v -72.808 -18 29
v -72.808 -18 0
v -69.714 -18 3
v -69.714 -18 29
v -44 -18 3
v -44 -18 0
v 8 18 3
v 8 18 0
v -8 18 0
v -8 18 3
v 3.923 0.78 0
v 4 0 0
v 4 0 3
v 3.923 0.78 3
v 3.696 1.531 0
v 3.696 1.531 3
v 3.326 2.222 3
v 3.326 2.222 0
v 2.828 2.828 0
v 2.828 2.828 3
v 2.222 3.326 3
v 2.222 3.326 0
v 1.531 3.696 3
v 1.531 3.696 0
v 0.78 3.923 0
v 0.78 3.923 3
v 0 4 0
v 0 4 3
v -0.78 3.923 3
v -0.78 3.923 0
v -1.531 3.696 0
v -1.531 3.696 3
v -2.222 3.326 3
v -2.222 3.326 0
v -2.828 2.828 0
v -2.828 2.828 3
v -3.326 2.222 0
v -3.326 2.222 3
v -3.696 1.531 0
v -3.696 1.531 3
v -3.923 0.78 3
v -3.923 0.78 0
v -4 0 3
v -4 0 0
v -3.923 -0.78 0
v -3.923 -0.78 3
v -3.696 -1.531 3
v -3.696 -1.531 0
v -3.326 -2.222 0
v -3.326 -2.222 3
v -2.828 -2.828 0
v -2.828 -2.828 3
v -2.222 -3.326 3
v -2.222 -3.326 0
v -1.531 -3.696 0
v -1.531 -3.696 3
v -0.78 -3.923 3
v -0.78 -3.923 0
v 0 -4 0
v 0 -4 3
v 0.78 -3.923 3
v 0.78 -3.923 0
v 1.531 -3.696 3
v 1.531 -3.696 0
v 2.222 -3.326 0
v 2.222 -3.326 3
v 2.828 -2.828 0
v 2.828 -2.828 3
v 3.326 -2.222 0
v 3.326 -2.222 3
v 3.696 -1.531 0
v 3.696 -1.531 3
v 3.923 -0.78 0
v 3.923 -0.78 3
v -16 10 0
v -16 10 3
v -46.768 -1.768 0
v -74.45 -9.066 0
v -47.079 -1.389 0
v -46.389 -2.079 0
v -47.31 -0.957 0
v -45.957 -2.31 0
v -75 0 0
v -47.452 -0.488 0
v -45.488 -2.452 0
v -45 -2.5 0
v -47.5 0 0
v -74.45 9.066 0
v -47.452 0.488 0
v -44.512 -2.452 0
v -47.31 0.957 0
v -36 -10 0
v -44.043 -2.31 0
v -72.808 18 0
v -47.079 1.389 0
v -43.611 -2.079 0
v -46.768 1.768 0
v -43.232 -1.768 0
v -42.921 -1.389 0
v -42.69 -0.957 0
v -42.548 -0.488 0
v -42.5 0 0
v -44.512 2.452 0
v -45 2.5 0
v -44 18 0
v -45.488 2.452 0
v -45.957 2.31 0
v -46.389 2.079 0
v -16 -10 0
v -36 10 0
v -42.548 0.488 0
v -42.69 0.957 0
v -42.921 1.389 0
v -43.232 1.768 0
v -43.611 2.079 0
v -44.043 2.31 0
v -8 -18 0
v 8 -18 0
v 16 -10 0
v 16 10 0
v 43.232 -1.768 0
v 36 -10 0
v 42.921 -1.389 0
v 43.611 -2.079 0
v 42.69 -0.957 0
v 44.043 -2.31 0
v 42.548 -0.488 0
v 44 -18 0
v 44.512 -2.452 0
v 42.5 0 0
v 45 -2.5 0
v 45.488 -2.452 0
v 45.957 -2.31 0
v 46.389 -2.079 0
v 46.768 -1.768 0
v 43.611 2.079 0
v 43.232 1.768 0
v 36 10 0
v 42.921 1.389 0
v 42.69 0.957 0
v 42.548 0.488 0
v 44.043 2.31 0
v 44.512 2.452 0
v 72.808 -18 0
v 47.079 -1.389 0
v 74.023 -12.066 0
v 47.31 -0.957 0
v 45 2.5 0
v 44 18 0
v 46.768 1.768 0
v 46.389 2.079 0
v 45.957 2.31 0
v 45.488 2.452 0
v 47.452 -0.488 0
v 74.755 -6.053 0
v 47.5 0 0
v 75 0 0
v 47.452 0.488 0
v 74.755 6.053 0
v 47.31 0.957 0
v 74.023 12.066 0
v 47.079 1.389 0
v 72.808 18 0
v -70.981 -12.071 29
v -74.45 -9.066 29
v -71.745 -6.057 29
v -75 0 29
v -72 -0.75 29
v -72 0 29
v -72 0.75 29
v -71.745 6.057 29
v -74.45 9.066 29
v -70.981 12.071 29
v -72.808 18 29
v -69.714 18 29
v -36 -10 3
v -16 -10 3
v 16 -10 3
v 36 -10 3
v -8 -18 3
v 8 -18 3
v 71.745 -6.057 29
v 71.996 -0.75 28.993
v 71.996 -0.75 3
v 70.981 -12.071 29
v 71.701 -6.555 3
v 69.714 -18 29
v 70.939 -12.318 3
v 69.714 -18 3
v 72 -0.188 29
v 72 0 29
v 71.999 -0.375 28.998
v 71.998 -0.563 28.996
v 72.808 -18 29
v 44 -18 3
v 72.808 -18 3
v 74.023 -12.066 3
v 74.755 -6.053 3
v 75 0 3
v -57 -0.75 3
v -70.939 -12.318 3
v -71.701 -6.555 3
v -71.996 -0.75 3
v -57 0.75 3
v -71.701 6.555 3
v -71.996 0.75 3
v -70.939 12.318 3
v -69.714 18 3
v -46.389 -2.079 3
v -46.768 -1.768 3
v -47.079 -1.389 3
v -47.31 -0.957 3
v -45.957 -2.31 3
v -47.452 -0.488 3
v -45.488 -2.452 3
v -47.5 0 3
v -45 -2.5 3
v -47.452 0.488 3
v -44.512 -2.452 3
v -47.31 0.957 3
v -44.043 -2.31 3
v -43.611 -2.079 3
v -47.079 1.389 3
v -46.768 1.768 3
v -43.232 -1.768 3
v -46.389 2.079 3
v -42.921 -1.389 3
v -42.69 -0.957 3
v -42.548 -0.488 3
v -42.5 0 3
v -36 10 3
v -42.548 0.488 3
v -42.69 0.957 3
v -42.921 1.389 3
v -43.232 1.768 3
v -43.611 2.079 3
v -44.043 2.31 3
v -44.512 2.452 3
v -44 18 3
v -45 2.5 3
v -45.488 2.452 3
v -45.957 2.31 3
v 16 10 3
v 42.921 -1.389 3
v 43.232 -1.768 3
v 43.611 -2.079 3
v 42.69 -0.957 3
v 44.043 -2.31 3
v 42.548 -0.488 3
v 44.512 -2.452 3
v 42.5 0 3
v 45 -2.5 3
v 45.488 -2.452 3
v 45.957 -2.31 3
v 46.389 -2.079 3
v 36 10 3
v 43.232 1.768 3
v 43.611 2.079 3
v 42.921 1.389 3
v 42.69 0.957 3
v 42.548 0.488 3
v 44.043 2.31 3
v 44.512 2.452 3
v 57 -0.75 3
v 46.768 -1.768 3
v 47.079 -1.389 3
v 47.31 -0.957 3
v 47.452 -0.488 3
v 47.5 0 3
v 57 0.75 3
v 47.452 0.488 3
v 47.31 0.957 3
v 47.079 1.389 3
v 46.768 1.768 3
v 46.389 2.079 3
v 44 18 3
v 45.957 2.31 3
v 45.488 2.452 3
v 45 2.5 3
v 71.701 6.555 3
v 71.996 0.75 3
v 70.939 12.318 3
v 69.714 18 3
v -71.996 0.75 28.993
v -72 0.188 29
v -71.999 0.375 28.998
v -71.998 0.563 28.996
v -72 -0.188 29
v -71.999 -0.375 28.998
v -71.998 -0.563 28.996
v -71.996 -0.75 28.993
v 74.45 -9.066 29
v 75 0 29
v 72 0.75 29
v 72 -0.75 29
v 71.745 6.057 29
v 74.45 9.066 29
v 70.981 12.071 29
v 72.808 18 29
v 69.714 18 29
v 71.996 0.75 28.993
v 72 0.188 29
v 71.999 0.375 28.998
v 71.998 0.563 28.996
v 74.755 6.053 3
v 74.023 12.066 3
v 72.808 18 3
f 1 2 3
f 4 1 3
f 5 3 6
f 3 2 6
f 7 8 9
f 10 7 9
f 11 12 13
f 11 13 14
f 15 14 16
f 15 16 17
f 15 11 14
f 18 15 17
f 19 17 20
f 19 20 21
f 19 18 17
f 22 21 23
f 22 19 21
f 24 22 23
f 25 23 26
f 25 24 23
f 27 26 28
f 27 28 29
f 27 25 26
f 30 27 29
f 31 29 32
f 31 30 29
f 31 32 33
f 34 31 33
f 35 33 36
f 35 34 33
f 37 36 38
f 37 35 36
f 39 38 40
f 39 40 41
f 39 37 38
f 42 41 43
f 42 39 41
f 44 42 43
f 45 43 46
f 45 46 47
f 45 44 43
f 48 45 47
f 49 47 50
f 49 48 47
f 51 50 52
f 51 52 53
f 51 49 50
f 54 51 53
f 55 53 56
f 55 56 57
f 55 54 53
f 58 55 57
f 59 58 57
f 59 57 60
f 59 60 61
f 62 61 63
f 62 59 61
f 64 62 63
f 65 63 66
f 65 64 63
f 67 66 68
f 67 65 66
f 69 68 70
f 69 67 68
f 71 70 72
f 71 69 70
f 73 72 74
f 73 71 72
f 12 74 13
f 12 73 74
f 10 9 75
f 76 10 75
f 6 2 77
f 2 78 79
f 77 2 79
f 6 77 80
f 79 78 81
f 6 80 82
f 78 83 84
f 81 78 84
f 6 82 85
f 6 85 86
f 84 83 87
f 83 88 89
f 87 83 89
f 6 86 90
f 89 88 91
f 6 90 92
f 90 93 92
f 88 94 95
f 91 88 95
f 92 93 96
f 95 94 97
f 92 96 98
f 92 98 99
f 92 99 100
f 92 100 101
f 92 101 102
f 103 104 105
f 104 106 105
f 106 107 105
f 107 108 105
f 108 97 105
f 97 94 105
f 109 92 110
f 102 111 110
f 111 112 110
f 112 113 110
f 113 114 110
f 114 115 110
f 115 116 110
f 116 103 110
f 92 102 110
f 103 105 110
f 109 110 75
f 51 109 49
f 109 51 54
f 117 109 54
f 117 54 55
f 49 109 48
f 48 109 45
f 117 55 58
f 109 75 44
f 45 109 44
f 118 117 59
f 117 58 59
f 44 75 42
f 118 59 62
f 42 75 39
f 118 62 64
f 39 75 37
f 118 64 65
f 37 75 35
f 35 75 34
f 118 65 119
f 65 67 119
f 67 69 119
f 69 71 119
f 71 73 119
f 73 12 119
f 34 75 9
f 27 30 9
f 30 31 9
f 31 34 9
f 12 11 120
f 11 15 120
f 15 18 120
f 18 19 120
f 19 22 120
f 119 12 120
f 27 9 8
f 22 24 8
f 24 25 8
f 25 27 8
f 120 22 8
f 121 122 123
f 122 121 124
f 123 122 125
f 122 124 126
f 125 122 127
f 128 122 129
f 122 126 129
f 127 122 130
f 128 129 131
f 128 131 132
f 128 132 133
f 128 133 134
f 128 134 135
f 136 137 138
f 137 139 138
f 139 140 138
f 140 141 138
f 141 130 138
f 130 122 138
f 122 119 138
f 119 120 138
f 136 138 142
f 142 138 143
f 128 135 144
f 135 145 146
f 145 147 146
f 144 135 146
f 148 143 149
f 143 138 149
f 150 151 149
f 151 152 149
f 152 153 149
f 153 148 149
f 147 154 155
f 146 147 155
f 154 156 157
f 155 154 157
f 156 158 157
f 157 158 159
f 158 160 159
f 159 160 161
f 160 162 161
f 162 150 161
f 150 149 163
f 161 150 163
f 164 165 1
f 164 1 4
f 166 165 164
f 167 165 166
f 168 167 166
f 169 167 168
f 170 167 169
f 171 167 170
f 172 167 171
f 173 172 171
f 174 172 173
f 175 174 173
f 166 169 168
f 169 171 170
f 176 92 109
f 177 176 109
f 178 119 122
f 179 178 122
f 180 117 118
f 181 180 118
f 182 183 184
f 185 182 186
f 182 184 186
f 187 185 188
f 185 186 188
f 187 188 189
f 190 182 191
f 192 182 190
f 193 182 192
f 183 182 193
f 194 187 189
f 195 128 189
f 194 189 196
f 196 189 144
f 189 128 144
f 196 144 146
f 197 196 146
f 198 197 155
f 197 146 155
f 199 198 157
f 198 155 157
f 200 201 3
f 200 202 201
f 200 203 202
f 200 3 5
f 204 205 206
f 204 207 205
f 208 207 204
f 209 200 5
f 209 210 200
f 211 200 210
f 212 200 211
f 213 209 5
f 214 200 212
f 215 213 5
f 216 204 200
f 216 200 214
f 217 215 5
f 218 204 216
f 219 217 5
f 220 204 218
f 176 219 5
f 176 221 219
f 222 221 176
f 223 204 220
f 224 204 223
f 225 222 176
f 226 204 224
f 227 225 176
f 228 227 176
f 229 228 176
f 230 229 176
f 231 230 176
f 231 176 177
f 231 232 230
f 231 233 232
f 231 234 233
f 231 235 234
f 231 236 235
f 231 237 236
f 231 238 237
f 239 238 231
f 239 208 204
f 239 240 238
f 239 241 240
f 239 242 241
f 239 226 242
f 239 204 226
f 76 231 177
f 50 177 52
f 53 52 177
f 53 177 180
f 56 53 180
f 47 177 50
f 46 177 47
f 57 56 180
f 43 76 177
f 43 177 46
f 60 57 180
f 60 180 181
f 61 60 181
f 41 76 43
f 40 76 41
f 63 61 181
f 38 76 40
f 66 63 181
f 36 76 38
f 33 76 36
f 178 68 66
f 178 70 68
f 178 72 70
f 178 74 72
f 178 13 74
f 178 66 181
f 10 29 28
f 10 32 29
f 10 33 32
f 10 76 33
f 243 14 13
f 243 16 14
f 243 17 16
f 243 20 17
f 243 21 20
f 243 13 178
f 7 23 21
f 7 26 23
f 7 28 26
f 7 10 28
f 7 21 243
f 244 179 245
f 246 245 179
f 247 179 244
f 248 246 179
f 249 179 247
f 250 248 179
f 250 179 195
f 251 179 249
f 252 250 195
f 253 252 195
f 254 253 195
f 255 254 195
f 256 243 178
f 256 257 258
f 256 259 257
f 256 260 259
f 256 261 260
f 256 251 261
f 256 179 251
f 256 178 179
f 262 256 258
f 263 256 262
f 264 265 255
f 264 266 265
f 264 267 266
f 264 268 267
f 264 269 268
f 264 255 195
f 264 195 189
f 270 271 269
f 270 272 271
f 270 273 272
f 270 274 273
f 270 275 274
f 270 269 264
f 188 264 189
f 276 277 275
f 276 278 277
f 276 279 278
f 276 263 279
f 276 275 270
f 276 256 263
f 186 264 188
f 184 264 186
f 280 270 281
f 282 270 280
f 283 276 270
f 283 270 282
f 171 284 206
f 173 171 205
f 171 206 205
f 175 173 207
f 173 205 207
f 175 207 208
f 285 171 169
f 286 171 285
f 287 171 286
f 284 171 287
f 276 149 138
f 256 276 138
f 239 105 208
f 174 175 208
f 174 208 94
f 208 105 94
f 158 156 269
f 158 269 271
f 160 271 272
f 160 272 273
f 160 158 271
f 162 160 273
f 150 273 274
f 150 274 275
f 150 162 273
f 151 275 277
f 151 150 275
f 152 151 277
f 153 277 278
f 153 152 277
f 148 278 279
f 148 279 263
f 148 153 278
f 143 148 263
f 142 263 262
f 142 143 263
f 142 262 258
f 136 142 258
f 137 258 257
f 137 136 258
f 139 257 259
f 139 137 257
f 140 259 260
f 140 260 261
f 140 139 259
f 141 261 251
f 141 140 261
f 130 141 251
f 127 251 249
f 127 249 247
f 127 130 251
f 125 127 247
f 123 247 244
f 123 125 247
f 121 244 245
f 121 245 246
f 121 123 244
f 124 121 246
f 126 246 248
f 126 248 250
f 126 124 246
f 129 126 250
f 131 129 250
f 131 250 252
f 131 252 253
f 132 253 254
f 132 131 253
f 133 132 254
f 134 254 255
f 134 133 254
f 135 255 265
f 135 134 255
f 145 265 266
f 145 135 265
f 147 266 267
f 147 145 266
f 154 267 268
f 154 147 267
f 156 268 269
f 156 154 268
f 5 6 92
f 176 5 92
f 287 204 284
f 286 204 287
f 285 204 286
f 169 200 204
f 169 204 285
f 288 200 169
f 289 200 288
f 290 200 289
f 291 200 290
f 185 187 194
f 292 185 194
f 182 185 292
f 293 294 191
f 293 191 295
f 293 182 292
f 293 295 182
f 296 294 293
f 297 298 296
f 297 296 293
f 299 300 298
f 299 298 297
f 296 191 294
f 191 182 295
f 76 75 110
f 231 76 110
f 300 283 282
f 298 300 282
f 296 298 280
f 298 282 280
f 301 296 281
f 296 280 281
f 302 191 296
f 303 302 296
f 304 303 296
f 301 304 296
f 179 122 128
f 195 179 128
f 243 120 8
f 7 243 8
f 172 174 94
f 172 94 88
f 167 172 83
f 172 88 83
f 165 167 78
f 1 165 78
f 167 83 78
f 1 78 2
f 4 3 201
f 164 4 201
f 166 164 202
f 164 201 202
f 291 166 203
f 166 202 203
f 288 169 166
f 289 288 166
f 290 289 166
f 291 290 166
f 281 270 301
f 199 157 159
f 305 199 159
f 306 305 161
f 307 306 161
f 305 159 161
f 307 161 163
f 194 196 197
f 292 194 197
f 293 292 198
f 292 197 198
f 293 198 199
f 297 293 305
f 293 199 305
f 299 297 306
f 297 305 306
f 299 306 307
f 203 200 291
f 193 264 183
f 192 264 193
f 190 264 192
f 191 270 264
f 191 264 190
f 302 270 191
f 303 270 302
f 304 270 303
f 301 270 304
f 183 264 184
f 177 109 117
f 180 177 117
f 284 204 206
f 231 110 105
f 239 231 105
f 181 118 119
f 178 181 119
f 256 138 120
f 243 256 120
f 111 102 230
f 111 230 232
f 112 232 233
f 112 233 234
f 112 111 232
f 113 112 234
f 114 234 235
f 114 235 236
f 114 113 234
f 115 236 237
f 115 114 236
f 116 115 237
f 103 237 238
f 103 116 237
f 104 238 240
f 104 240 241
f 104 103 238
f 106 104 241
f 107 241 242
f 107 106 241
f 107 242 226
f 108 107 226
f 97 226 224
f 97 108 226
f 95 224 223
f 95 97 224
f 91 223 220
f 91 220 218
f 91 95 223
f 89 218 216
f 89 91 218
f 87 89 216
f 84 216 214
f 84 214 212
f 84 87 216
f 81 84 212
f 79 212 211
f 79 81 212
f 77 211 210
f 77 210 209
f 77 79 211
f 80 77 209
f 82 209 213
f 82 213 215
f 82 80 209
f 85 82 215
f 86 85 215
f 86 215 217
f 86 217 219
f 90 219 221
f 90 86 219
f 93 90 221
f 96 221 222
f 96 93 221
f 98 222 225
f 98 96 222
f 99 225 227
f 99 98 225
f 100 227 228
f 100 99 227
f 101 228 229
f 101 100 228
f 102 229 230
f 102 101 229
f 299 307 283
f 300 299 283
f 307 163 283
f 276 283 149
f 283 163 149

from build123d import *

# Parameters (mm, degrees)
SKETCH1_R           = 2.5
SKETCH1_R_2         = 4
BOSS_EXTRUDE1_DEPTH = 3
BOSS_EXTRUDE2_DEPTH = 26
BOSS_EXTRUDE3_DEPTH = 0.75


with BuildPart() as part:
    # Sketch1 → Boss-Extrude1 (new body)
    with BuildSketch(Plane.XY):
        with BuildLine():
            Line((-44, 18), (-72.807966597, 18))
            ThreePointArc((-72.807966597, 18), (-75, 0), (-72.807966597, -18))
            Line((-72.807966597, -18), (-44, -18))
            Line((-44, -18), (-36, -10))
            Line((-36, -10), (-16, -10))
            Line((-16, -10), (-8, -18))
            Line((-8, -18), (8, -18))
            Line((8, -18), (16, -10))
            Line((16, -10), (36, -10))
            Line((36, -10), (44, -18))
            Line((44, -18), (72.807966597, -18))
            ThreePointArc((72.807966597, -18), (74.449974798, -9.066490645), (75, 0))
            ThreePointArc((75, 0), (74.449974798, 9.066490645), (72.807966597, 18))
            Line((72.807966597, 18), (44, 18))
            Line((44, 18), (36, 10))
            Line((36, 10), (16, 10))
            Line((16, 10), (8, 18))
            Line((8, 18), (-8, 18))
            Line((-8, 18), (-16, 10))
            Line((-16, 10), (-36, 10))
            Line((-36, 10), (-44, 18))
        make_face()
        with Locations((-45, 0)):
            Circle(SKETCH1_R, mode=Mode.SUBTRACT)
        Circle(SKETCH1_R_2, mode=Mode.SUBTRACT)
        with Locations((45, 0)):
            Circle(SKETCH1_R, mode=Mode.SUBTRACT)
    extrude(amount=BOSS_EXTRUDE1_DEPTH)

    # Sketch2 → Boss-Extrude2 (add)
    with BuildSketch(Plane.XY.offset(3)):
        with BuildLine():
            ThreePointArc((69.713700232, 18), (72, 0), (69.713700232, -18))
            Line((69.713700232, -18), (72.807966597, -18))
            ThreePointArc((72.807966597, -18), (75, 0), (72.807966597, 18))
            Line((72.807966597, 18), (69.713700232, 18))
        make_face()
        with BuildLine():
            ThreePointArc((-72.807966597, 18), (-75, 0), (-72.807966597, -18))
            Line((-72.807966597, -18), (-69.713700232, -18))
            ThreePointArc((-69.713700232, -18), (-72, 0), (-69.713700232, 18))
            Line((-69.713700232, 18), (-72.807966597, 18))
        make_face()
    extrude(amount=BOSS_EXTRUDE2_DEPTH)

    # Sketch3 → Boss-Extrude3 (add, symmetric)
    with BuildSketch(Plane(origin=(0, 0, 0), x_dir=(-1, 0, 0), z_dir=(0, -1, 0))):
        Polygon((-72, -3), (-57, -3), (-72, -29), align=None)
        Polygon((72, -29), (72, -3), (57, -3), align=None)
    boss_extrude3 = extrude(amount=BOSS_EXTRUDE3_DEPTH, both=True)

    # Mirror1: Boss-Extrude3 across plane
    add(boss_extrude3.mirror(Plane(origin=(0, 0, 0), x_dir=(0, 0, 1), z_dir=(1, 0, 0))))


solid = part.part
